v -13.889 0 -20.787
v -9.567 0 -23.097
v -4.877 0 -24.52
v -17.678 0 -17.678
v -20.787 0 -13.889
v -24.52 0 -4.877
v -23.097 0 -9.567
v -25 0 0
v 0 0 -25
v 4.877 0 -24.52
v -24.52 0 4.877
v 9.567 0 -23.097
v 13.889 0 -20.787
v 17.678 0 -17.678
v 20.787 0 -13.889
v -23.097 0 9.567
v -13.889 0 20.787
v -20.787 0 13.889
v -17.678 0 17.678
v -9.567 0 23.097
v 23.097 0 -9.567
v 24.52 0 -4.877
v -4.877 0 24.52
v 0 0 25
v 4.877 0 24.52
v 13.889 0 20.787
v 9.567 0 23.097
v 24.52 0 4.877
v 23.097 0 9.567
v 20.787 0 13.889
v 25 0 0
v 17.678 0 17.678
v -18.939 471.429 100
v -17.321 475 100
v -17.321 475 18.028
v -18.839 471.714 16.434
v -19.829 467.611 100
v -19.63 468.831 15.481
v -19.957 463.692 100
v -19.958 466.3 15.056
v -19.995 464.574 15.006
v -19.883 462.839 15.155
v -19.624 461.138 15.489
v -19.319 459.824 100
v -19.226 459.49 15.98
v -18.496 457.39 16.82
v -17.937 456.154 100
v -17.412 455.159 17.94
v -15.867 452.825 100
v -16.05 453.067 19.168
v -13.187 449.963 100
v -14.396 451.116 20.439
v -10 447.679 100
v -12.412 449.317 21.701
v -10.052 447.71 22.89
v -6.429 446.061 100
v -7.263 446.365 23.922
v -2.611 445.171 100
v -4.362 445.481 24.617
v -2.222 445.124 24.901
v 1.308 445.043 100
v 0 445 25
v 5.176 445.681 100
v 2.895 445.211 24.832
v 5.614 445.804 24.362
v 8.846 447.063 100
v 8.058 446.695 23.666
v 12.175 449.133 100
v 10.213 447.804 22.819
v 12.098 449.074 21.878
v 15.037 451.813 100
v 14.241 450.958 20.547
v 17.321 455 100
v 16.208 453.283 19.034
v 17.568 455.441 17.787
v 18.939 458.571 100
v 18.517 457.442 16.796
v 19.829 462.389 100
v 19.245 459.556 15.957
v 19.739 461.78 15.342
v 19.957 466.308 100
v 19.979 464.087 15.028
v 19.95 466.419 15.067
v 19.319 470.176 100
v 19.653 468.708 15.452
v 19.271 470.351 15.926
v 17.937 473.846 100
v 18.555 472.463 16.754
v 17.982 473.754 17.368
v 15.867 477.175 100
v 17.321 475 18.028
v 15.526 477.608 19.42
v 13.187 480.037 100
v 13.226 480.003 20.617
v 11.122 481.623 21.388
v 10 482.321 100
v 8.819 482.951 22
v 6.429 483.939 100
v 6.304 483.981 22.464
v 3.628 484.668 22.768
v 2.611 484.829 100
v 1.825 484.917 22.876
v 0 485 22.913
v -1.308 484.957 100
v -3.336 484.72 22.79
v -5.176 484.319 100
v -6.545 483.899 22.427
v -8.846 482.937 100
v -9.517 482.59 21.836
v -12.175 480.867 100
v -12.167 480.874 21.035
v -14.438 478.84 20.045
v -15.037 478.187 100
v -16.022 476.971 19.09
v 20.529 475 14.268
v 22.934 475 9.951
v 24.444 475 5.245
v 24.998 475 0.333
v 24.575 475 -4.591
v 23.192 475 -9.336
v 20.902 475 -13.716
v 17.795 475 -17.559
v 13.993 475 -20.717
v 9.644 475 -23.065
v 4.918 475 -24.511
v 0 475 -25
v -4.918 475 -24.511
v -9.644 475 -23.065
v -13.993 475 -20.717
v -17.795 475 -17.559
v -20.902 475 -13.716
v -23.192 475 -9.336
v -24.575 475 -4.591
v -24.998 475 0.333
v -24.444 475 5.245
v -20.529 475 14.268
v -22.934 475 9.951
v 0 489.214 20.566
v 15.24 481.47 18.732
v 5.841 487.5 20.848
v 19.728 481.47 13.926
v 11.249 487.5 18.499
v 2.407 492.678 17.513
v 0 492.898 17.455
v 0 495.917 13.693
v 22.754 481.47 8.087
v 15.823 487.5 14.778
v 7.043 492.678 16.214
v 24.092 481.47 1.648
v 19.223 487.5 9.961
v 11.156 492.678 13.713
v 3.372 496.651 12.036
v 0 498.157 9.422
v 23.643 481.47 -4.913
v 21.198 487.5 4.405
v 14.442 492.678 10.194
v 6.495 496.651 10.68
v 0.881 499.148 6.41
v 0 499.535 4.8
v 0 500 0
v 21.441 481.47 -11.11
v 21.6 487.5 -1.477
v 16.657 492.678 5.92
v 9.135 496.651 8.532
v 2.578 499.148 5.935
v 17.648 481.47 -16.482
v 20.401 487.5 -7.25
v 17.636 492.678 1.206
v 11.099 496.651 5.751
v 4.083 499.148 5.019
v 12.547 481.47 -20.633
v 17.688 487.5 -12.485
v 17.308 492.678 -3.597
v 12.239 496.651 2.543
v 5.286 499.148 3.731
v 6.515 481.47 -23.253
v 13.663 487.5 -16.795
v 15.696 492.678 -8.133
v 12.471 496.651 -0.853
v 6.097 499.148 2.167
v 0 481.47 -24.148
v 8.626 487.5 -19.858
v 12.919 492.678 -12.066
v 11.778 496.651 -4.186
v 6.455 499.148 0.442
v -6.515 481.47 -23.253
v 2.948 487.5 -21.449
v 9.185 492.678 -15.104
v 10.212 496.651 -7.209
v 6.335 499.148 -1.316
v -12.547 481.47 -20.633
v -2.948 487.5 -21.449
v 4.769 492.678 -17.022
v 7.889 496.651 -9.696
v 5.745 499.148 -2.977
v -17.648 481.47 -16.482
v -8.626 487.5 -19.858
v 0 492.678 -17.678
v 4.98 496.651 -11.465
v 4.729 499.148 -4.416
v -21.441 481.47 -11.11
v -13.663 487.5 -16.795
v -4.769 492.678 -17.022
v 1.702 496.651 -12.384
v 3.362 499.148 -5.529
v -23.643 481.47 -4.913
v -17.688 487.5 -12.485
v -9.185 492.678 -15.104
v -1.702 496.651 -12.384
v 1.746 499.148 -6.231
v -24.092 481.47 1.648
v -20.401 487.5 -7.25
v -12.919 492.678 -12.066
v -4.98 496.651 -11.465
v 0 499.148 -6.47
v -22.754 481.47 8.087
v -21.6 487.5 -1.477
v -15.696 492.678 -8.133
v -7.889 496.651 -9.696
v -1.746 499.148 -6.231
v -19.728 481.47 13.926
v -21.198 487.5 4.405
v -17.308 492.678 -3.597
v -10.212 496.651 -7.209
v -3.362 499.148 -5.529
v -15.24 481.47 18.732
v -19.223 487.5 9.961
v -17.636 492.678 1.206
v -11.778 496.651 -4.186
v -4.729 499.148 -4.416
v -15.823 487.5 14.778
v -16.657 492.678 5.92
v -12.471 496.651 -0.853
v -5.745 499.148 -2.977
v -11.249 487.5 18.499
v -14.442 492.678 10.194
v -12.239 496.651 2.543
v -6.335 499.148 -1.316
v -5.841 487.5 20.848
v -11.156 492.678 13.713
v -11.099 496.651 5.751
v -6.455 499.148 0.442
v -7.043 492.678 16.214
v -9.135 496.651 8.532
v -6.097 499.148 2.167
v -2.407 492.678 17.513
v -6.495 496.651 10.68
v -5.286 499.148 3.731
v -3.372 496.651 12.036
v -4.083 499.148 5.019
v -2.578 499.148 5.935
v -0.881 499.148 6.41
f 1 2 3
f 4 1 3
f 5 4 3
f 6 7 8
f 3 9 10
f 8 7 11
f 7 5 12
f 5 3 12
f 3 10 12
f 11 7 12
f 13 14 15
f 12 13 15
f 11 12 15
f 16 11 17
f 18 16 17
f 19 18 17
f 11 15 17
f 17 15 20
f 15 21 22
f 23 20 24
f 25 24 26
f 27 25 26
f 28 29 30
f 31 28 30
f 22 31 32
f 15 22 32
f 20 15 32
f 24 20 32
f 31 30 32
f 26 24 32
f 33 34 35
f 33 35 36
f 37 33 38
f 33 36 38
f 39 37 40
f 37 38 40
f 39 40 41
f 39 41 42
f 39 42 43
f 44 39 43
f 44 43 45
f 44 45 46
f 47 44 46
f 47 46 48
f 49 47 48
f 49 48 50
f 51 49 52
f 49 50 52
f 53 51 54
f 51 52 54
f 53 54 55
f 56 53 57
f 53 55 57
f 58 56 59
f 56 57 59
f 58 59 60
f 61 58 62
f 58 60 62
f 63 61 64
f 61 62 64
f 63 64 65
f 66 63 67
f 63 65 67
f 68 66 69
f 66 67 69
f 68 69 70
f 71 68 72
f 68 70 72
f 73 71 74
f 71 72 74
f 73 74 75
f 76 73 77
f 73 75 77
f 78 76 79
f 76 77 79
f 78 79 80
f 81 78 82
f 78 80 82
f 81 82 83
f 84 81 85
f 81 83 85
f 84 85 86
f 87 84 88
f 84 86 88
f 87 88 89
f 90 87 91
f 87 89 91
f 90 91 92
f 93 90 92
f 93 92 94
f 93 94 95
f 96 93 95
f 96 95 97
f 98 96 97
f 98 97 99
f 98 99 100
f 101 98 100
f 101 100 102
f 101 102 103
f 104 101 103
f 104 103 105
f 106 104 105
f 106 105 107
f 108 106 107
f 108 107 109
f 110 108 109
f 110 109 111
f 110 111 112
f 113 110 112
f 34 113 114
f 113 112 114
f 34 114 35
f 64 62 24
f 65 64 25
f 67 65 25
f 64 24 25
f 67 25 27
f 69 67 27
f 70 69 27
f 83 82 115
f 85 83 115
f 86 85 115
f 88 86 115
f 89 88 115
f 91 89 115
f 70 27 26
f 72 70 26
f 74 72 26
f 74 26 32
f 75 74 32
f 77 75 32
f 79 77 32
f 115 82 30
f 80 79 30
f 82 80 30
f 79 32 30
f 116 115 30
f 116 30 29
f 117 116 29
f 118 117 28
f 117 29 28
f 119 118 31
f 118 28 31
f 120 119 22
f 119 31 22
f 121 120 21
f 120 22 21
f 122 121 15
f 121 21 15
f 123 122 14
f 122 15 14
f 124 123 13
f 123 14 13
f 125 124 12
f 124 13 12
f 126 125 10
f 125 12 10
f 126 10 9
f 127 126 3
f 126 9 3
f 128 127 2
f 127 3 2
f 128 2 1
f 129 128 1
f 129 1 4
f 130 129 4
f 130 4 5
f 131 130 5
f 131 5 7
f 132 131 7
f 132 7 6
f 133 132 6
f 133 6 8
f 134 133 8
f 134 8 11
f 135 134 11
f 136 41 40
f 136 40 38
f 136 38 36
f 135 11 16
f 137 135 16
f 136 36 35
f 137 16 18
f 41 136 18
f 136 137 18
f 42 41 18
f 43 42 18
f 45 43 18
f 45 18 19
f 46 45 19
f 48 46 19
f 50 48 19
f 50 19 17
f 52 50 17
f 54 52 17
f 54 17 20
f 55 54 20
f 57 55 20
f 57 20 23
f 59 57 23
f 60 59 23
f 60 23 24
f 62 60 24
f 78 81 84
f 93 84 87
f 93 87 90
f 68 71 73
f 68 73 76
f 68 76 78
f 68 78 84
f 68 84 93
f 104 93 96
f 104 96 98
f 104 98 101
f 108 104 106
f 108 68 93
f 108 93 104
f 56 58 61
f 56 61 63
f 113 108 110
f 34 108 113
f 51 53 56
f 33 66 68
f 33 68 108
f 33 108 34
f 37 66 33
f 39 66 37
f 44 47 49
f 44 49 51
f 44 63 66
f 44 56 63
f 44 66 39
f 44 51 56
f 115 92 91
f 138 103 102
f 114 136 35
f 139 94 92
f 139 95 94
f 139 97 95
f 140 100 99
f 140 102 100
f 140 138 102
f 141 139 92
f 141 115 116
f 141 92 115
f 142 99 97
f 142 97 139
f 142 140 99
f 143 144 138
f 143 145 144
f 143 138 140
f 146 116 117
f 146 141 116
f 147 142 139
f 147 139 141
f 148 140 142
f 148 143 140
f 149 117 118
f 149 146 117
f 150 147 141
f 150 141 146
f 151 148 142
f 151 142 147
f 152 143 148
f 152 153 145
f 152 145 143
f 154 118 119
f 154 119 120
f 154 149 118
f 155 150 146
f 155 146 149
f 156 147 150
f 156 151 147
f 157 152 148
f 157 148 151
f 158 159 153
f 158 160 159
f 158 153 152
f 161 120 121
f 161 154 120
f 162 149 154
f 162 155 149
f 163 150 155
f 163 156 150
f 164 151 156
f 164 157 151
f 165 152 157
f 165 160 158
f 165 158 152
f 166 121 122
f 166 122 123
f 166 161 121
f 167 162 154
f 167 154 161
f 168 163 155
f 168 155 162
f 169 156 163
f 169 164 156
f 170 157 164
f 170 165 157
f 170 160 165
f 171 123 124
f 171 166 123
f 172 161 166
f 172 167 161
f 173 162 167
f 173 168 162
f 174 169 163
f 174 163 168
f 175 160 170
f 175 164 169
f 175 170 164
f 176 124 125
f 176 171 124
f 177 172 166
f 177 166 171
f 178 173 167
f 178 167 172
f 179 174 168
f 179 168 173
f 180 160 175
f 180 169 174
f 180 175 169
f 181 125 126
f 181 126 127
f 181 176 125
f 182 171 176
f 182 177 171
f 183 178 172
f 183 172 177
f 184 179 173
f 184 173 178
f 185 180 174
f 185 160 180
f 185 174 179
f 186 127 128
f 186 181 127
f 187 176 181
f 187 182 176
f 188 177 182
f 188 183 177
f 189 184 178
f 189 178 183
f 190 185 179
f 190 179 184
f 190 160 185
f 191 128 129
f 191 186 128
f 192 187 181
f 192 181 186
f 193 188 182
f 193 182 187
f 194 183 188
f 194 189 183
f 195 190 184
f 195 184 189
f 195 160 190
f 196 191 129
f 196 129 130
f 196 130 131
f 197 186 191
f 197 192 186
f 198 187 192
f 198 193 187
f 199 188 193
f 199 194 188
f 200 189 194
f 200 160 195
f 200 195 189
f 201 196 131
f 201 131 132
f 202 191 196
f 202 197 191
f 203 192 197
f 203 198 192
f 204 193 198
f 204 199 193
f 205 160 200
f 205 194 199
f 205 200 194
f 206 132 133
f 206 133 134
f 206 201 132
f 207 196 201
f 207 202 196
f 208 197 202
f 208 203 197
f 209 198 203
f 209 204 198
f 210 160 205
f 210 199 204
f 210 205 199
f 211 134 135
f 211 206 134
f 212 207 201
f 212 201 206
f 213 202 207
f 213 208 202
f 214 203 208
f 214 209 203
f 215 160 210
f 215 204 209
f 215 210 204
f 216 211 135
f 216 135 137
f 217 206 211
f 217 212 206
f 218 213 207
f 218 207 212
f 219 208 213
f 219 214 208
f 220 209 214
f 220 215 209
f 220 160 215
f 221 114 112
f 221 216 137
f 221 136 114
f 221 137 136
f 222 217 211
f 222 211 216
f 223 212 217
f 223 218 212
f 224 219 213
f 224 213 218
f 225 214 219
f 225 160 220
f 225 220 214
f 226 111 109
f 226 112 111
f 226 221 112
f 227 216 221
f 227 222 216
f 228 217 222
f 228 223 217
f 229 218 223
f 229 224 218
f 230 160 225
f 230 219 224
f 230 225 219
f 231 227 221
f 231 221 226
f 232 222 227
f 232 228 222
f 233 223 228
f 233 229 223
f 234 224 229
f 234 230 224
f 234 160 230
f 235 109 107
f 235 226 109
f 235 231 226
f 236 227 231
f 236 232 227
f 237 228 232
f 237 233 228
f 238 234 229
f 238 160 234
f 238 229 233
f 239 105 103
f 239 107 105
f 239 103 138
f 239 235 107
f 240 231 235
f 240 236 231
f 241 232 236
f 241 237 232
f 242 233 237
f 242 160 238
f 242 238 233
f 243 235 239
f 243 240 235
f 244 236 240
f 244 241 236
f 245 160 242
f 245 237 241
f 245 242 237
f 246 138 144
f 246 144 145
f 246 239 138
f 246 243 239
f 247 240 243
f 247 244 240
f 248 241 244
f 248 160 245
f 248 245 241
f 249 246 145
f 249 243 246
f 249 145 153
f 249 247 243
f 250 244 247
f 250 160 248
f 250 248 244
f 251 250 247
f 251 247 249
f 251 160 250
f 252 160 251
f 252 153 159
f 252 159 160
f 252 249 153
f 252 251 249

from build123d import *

# Parameters (mm, degrees)
SKETCH_1_R      = 25
EXTRUDE_1_DEPTH = 500
FILLET_1_R      = 25
SKETCH_3_R      = 20
EXTRUDE_2_DEPTH = 100


with BuildPart() as part:
    # 草图1 → 凸台-拉伸1 (new body)
    with BuildSketch(Plane(origin=(0, 0, 0), x_dir=(1, 0, 0), z_dir=(0, 1, 0))):
        with Locations(Location((0, 0, 0), (0, 0, 270))):
            Circle(SKETCH_1_R)
    extrude(amount=EXTRUDE_1_DEPTH)

    # 圆角1
    fillet_1_edges = [part.edges().sort_by_distance(p)[0] for p in [
        (0, 500, -25),
    ]]
    fillet(fillet_1_edges, radius=FILLET_1_R)

    # 草图3 → 凸台-拉伸2 (add)
    with BuildSketch(Plane.XY):
        with Locations(Location((0, 465, 0), (0, 0, 149.999999999))):
            Circle(SKETCH_3_R)
    extrude(amount=EXTRUDE_2_DEPTH)


solid = part.part
